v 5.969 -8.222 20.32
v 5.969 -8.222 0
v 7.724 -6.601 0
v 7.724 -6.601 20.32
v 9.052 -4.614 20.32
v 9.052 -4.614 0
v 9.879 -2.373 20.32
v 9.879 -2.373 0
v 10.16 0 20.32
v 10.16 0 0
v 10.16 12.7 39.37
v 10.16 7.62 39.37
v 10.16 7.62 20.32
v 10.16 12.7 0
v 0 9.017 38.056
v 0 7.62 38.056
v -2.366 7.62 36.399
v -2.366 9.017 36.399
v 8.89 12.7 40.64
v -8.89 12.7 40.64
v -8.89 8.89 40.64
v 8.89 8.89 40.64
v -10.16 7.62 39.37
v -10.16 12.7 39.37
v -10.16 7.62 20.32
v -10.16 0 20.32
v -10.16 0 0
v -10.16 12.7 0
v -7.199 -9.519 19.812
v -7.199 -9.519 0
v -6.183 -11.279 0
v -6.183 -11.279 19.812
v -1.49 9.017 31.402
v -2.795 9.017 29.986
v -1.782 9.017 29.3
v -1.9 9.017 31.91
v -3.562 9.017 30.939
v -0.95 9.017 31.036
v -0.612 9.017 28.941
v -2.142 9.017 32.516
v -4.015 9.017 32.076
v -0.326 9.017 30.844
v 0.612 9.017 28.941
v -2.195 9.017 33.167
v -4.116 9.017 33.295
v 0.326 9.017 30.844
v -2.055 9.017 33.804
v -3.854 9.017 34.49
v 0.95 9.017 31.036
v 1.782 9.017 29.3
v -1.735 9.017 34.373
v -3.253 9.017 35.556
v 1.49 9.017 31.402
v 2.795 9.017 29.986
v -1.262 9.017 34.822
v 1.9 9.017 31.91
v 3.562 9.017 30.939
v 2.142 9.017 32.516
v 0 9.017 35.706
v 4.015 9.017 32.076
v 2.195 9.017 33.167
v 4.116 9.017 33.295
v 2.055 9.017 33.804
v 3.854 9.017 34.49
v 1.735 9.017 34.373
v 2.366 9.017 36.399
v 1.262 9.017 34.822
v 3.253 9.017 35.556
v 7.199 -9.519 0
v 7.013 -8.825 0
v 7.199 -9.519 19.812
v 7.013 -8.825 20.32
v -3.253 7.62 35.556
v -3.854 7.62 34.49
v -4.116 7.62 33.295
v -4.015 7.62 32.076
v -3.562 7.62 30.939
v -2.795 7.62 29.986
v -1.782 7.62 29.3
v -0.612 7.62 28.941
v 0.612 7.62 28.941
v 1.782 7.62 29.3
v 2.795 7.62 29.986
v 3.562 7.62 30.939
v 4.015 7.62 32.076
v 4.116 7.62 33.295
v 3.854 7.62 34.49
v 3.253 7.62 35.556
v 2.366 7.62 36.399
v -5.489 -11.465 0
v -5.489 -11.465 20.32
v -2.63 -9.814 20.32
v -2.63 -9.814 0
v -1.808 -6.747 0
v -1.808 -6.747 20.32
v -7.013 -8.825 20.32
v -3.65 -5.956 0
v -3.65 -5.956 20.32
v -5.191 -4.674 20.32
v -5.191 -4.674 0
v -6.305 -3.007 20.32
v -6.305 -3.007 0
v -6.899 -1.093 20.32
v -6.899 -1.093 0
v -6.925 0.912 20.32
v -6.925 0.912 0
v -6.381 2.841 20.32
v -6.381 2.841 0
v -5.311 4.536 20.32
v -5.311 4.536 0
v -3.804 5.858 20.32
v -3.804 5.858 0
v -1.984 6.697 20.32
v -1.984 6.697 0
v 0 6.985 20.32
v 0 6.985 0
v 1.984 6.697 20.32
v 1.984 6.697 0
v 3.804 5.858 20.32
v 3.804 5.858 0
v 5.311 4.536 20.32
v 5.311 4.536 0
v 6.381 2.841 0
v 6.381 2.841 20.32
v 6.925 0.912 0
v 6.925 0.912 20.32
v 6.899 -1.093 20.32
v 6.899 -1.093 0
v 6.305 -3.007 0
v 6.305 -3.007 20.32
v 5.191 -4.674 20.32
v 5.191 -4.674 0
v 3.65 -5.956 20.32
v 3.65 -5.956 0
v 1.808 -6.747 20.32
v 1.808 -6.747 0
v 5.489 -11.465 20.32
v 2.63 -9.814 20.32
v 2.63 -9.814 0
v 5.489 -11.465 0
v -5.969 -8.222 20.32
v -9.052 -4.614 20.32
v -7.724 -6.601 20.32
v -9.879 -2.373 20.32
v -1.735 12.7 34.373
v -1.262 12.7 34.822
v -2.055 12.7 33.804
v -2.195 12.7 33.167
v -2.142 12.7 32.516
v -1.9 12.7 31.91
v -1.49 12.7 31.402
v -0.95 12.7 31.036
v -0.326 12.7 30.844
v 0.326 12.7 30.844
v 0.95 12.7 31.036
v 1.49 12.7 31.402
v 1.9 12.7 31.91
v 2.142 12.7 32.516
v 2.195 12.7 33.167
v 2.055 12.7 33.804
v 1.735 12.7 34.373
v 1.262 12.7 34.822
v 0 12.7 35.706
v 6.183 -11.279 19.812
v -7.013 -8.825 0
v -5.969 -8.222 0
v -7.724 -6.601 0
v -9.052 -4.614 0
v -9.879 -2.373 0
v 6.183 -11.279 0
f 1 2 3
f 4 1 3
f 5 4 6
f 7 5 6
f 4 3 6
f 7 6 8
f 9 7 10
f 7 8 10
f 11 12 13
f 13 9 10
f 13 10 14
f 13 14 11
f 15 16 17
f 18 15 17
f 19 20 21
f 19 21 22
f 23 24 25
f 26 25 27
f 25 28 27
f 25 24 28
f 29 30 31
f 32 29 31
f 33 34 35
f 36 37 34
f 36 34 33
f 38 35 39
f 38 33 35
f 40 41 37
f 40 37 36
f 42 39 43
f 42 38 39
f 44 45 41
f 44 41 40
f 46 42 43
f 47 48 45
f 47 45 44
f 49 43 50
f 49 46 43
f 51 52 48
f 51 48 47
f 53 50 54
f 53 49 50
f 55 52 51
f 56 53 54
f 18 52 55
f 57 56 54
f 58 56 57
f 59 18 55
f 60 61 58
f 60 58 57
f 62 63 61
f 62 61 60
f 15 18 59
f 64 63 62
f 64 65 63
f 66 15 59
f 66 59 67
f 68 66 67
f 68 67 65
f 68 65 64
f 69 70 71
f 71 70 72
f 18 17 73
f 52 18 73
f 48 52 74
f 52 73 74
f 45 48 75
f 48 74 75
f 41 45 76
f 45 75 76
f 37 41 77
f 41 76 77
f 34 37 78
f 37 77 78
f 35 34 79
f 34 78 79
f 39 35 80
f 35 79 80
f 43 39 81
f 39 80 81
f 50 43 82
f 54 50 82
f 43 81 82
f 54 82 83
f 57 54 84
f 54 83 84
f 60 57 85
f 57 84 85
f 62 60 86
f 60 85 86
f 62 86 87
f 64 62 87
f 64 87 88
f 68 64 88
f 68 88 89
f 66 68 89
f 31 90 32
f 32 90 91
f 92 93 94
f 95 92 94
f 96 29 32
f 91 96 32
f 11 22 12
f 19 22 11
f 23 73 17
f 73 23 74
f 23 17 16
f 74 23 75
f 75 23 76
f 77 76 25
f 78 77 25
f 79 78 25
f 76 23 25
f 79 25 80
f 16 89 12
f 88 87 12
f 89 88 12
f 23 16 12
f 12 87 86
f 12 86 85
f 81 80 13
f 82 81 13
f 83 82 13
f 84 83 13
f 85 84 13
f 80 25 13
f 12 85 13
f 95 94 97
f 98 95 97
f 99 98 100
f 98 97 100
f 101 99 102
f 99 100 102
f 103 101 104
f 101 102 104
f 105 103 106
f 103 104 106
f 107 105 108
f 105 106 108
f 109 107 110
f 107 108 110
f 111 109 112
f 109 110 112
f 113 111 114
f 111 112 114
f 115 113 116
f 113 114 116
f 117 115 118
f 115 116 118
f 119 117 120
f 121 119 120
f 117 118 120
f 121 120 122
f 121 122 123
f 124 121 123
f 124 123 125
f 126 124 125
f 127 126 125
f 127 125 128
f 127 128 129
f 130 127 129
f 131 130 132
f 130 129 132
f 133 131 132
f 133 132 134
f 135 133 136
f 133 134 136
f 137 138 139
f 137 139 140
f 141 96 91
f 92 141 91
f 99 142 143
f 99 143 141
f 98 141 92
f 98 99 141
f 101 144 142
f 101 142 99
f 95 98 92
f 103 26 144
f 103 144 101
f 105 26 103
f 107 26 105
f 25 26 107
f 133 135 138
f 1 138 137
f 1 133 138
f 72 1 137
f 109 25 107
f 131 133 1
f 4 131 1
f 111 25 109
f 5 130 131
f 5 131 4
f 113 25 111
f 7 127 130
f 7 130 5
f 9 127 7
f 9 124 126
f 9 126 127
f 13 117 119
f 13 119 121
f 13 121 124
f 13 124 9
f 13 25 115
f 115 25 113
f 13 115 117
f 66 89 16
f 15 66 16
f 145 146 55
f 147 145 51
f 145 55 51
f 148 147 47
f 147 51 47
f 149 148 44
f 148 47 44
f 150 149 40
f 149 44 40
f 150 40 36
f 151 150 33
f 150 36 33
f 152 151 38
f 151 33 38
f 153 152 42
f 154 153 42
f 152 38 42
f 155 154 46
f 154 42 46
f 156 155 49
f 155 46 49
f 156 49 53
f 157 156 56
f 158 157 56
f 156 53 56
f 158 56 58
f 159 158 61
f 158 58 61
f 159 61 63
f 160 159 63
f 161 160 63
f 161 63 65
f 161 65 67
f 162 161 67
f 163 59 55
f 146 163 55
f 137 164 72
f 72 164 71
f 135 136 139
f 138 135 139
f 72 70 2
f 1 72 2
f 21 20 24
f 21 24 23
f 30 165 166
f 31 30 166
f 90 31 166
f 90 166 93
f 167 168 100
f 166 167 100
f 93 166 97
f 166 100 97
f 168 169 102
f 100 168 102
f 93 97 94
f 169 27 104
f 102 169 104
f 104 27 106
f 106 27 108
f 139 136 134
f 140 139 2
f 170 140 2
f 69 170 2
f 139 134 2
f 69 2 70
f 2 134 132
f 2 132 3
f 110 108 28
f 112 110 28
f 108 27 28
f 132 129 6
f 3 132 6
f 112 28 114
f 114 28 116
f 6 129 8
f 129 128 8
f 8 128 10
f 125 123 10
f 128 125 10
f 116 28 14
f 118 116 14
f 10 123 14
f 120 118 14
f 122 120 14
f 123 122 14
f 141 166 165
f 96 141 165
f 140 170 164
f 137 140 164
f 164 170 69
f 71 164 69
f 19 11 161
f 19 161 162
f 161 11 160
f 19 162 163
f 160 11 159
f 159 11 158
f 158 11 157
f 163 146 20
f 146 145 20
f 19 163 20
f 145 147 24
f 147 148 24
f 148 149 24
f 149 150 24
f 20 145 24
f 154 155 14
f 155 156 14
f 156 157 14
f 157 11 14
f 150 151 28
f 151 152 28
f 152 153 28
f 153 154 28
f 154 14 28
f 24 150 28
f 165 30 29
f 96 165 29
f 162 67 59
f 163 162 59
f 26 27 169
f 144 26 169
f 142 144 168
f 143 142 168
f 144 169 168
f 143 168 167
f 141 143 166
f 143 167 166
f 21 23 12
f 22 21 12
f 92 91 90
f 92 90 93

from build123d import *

# Parameters (mm, degrees)
CLIP_DEPTH        = 20.32
SKETCH1_3_W       = 20.32
SKETCH1_3_H       = 5.08
BACK_DEPTH        = 40.64
HOLE_DEPTH        = 47.139187604
COUNTERBORE_DEPTH = 1.397
CHAMFER1_SIZE     = 1.27
CHAMFER2_SIZE     = 0.508


with BuildPart() as part:
    # Sketch1 → clip (new body)
    with BuildSketch(Plane.XY):
        with BuildLine():
            Line((-2.629601498, -9.813806395), (-1.80785103, -6.746991897))
            ThreePointArc((-1.80785103, -6.746991897), (0, 6.985), (1.80785103, -6.746991897))
            Line((1.80785103, -6.746991897), (2.629601498, -9.813806395))
            Line((2.629601498, -9.813806395), (5.929158287, -11.718806395))
            Line((5.929158287, -11.718806395), (7.453158287, -9.079160964))
            Line((7.453158287, -9.079160964), (5.96856706, -8.22203182))
            ThreePointArc((5.96856706, -8.22203182), (9.051691591, -4.614377459), (10.16, 0))
            Line((10.16, 0), (10.16, 12.7))
            Line((10.16, 12.7), (-10.16, 12.7))
            Line((-10.16, 12.7), (-10.16, 0))
            ThreePointArc((-10.16, 0), (-9.051691591, -4.614377459), (-5.96856706, -8.22203182))
            Line((-5.96856706, -8.22203182), (-7.453158287, -9.079160964))
            Line((-7.453158287, -9.079160964), (-5.929158287, -11.718806395))
            Line((-5.929158287, -11.718806395), (-2.629601498, -9.813806395))
        make_face()
    extrude(amount=CLIP_DEPTH)

    # Sketch1<3> → back (add)
    with BuildSketch(Plane.XY):
        with Locations((0, 10.16)):
            Rectangle(SKETCH1_3_W, SKETCH1_3_H)
    extrude(amount=BACK_DEPTH)

    # Sketch4 → hole (cut, through all)
    with BuildSketch(Plane.XZ.offset(-7.62)):
        with BuildLine():
            Line((1.26186816, 34.822134497), (0, 35.705704095))
            Line((0, 35.705704095), (-1.26186816, 34.822134497))
            ThreePointArc((-1.26186816, 34.822134497), (0, 30.82), (1.26186816, 34.822134497))
        make_face()
    extrude(amount=-HOLE_DEPTH, mode=Mode.SUBTRACT)

    # Sketch4<3> → counterbore (cut)
    with BuildSketch(Plane.XZ.offset(-7.62)):
        with BuildLine():
            Line((2.3660028, 36.399002183), (0, 38.055695179))
            Line((0, 38.055695179), (-2.3660028, 36.399002183))
            ThreePointArc((-2.3660028, 36.399002183), (0, 28.895), (2.3660028, 36.399002183))
        make_face()
        with BuildLine():
            Line((-1.26186816, 34.822134497), (0, 35.705704095))
            Line((0, 35.705704095), (1.26186816, 34.822134497))
            ThreePointArc((1.26186816, 34.822134497), (0, 30.82), (-1.26186816, 34.822134497))
        make_face(mode=Mode.SUBTRACT)
    extrude(amount=-COUNTERBORE_DEPTH, mode=Mode.SUBTRACT)

    # Chamfer1
    chamfer1_edges = [part.edges().sort_by_distance(p)[0] for p in [
        (-10.16, 10.16, 40.64),
        (10.16, 10.16, 40.64),
        (0, 7.62, 40.64),
    ]]
    chamfer(chamfer1_edges, length=CHAMFER1_SIZE)

    # Chamfer2
    chamfer2_edges = [part.edges().sort_by_distance(p)[0] for p in [
        (7.453158287, -9.079160964, 10.16),
        (5.929158287, -11.718806395, 10.16),
        (6.691158287, -10.39898368, 20.32),
        (-7.453158287, -9.079160964, 10.16),
        (-5.929158287, -11.718806395, 10.16),
        (-6.691158287, -10.39898368, 20.32),
    ]]
    chamfer(chamfer2_edges, length=CHAMFER2_SIZE)


solid = part.part
